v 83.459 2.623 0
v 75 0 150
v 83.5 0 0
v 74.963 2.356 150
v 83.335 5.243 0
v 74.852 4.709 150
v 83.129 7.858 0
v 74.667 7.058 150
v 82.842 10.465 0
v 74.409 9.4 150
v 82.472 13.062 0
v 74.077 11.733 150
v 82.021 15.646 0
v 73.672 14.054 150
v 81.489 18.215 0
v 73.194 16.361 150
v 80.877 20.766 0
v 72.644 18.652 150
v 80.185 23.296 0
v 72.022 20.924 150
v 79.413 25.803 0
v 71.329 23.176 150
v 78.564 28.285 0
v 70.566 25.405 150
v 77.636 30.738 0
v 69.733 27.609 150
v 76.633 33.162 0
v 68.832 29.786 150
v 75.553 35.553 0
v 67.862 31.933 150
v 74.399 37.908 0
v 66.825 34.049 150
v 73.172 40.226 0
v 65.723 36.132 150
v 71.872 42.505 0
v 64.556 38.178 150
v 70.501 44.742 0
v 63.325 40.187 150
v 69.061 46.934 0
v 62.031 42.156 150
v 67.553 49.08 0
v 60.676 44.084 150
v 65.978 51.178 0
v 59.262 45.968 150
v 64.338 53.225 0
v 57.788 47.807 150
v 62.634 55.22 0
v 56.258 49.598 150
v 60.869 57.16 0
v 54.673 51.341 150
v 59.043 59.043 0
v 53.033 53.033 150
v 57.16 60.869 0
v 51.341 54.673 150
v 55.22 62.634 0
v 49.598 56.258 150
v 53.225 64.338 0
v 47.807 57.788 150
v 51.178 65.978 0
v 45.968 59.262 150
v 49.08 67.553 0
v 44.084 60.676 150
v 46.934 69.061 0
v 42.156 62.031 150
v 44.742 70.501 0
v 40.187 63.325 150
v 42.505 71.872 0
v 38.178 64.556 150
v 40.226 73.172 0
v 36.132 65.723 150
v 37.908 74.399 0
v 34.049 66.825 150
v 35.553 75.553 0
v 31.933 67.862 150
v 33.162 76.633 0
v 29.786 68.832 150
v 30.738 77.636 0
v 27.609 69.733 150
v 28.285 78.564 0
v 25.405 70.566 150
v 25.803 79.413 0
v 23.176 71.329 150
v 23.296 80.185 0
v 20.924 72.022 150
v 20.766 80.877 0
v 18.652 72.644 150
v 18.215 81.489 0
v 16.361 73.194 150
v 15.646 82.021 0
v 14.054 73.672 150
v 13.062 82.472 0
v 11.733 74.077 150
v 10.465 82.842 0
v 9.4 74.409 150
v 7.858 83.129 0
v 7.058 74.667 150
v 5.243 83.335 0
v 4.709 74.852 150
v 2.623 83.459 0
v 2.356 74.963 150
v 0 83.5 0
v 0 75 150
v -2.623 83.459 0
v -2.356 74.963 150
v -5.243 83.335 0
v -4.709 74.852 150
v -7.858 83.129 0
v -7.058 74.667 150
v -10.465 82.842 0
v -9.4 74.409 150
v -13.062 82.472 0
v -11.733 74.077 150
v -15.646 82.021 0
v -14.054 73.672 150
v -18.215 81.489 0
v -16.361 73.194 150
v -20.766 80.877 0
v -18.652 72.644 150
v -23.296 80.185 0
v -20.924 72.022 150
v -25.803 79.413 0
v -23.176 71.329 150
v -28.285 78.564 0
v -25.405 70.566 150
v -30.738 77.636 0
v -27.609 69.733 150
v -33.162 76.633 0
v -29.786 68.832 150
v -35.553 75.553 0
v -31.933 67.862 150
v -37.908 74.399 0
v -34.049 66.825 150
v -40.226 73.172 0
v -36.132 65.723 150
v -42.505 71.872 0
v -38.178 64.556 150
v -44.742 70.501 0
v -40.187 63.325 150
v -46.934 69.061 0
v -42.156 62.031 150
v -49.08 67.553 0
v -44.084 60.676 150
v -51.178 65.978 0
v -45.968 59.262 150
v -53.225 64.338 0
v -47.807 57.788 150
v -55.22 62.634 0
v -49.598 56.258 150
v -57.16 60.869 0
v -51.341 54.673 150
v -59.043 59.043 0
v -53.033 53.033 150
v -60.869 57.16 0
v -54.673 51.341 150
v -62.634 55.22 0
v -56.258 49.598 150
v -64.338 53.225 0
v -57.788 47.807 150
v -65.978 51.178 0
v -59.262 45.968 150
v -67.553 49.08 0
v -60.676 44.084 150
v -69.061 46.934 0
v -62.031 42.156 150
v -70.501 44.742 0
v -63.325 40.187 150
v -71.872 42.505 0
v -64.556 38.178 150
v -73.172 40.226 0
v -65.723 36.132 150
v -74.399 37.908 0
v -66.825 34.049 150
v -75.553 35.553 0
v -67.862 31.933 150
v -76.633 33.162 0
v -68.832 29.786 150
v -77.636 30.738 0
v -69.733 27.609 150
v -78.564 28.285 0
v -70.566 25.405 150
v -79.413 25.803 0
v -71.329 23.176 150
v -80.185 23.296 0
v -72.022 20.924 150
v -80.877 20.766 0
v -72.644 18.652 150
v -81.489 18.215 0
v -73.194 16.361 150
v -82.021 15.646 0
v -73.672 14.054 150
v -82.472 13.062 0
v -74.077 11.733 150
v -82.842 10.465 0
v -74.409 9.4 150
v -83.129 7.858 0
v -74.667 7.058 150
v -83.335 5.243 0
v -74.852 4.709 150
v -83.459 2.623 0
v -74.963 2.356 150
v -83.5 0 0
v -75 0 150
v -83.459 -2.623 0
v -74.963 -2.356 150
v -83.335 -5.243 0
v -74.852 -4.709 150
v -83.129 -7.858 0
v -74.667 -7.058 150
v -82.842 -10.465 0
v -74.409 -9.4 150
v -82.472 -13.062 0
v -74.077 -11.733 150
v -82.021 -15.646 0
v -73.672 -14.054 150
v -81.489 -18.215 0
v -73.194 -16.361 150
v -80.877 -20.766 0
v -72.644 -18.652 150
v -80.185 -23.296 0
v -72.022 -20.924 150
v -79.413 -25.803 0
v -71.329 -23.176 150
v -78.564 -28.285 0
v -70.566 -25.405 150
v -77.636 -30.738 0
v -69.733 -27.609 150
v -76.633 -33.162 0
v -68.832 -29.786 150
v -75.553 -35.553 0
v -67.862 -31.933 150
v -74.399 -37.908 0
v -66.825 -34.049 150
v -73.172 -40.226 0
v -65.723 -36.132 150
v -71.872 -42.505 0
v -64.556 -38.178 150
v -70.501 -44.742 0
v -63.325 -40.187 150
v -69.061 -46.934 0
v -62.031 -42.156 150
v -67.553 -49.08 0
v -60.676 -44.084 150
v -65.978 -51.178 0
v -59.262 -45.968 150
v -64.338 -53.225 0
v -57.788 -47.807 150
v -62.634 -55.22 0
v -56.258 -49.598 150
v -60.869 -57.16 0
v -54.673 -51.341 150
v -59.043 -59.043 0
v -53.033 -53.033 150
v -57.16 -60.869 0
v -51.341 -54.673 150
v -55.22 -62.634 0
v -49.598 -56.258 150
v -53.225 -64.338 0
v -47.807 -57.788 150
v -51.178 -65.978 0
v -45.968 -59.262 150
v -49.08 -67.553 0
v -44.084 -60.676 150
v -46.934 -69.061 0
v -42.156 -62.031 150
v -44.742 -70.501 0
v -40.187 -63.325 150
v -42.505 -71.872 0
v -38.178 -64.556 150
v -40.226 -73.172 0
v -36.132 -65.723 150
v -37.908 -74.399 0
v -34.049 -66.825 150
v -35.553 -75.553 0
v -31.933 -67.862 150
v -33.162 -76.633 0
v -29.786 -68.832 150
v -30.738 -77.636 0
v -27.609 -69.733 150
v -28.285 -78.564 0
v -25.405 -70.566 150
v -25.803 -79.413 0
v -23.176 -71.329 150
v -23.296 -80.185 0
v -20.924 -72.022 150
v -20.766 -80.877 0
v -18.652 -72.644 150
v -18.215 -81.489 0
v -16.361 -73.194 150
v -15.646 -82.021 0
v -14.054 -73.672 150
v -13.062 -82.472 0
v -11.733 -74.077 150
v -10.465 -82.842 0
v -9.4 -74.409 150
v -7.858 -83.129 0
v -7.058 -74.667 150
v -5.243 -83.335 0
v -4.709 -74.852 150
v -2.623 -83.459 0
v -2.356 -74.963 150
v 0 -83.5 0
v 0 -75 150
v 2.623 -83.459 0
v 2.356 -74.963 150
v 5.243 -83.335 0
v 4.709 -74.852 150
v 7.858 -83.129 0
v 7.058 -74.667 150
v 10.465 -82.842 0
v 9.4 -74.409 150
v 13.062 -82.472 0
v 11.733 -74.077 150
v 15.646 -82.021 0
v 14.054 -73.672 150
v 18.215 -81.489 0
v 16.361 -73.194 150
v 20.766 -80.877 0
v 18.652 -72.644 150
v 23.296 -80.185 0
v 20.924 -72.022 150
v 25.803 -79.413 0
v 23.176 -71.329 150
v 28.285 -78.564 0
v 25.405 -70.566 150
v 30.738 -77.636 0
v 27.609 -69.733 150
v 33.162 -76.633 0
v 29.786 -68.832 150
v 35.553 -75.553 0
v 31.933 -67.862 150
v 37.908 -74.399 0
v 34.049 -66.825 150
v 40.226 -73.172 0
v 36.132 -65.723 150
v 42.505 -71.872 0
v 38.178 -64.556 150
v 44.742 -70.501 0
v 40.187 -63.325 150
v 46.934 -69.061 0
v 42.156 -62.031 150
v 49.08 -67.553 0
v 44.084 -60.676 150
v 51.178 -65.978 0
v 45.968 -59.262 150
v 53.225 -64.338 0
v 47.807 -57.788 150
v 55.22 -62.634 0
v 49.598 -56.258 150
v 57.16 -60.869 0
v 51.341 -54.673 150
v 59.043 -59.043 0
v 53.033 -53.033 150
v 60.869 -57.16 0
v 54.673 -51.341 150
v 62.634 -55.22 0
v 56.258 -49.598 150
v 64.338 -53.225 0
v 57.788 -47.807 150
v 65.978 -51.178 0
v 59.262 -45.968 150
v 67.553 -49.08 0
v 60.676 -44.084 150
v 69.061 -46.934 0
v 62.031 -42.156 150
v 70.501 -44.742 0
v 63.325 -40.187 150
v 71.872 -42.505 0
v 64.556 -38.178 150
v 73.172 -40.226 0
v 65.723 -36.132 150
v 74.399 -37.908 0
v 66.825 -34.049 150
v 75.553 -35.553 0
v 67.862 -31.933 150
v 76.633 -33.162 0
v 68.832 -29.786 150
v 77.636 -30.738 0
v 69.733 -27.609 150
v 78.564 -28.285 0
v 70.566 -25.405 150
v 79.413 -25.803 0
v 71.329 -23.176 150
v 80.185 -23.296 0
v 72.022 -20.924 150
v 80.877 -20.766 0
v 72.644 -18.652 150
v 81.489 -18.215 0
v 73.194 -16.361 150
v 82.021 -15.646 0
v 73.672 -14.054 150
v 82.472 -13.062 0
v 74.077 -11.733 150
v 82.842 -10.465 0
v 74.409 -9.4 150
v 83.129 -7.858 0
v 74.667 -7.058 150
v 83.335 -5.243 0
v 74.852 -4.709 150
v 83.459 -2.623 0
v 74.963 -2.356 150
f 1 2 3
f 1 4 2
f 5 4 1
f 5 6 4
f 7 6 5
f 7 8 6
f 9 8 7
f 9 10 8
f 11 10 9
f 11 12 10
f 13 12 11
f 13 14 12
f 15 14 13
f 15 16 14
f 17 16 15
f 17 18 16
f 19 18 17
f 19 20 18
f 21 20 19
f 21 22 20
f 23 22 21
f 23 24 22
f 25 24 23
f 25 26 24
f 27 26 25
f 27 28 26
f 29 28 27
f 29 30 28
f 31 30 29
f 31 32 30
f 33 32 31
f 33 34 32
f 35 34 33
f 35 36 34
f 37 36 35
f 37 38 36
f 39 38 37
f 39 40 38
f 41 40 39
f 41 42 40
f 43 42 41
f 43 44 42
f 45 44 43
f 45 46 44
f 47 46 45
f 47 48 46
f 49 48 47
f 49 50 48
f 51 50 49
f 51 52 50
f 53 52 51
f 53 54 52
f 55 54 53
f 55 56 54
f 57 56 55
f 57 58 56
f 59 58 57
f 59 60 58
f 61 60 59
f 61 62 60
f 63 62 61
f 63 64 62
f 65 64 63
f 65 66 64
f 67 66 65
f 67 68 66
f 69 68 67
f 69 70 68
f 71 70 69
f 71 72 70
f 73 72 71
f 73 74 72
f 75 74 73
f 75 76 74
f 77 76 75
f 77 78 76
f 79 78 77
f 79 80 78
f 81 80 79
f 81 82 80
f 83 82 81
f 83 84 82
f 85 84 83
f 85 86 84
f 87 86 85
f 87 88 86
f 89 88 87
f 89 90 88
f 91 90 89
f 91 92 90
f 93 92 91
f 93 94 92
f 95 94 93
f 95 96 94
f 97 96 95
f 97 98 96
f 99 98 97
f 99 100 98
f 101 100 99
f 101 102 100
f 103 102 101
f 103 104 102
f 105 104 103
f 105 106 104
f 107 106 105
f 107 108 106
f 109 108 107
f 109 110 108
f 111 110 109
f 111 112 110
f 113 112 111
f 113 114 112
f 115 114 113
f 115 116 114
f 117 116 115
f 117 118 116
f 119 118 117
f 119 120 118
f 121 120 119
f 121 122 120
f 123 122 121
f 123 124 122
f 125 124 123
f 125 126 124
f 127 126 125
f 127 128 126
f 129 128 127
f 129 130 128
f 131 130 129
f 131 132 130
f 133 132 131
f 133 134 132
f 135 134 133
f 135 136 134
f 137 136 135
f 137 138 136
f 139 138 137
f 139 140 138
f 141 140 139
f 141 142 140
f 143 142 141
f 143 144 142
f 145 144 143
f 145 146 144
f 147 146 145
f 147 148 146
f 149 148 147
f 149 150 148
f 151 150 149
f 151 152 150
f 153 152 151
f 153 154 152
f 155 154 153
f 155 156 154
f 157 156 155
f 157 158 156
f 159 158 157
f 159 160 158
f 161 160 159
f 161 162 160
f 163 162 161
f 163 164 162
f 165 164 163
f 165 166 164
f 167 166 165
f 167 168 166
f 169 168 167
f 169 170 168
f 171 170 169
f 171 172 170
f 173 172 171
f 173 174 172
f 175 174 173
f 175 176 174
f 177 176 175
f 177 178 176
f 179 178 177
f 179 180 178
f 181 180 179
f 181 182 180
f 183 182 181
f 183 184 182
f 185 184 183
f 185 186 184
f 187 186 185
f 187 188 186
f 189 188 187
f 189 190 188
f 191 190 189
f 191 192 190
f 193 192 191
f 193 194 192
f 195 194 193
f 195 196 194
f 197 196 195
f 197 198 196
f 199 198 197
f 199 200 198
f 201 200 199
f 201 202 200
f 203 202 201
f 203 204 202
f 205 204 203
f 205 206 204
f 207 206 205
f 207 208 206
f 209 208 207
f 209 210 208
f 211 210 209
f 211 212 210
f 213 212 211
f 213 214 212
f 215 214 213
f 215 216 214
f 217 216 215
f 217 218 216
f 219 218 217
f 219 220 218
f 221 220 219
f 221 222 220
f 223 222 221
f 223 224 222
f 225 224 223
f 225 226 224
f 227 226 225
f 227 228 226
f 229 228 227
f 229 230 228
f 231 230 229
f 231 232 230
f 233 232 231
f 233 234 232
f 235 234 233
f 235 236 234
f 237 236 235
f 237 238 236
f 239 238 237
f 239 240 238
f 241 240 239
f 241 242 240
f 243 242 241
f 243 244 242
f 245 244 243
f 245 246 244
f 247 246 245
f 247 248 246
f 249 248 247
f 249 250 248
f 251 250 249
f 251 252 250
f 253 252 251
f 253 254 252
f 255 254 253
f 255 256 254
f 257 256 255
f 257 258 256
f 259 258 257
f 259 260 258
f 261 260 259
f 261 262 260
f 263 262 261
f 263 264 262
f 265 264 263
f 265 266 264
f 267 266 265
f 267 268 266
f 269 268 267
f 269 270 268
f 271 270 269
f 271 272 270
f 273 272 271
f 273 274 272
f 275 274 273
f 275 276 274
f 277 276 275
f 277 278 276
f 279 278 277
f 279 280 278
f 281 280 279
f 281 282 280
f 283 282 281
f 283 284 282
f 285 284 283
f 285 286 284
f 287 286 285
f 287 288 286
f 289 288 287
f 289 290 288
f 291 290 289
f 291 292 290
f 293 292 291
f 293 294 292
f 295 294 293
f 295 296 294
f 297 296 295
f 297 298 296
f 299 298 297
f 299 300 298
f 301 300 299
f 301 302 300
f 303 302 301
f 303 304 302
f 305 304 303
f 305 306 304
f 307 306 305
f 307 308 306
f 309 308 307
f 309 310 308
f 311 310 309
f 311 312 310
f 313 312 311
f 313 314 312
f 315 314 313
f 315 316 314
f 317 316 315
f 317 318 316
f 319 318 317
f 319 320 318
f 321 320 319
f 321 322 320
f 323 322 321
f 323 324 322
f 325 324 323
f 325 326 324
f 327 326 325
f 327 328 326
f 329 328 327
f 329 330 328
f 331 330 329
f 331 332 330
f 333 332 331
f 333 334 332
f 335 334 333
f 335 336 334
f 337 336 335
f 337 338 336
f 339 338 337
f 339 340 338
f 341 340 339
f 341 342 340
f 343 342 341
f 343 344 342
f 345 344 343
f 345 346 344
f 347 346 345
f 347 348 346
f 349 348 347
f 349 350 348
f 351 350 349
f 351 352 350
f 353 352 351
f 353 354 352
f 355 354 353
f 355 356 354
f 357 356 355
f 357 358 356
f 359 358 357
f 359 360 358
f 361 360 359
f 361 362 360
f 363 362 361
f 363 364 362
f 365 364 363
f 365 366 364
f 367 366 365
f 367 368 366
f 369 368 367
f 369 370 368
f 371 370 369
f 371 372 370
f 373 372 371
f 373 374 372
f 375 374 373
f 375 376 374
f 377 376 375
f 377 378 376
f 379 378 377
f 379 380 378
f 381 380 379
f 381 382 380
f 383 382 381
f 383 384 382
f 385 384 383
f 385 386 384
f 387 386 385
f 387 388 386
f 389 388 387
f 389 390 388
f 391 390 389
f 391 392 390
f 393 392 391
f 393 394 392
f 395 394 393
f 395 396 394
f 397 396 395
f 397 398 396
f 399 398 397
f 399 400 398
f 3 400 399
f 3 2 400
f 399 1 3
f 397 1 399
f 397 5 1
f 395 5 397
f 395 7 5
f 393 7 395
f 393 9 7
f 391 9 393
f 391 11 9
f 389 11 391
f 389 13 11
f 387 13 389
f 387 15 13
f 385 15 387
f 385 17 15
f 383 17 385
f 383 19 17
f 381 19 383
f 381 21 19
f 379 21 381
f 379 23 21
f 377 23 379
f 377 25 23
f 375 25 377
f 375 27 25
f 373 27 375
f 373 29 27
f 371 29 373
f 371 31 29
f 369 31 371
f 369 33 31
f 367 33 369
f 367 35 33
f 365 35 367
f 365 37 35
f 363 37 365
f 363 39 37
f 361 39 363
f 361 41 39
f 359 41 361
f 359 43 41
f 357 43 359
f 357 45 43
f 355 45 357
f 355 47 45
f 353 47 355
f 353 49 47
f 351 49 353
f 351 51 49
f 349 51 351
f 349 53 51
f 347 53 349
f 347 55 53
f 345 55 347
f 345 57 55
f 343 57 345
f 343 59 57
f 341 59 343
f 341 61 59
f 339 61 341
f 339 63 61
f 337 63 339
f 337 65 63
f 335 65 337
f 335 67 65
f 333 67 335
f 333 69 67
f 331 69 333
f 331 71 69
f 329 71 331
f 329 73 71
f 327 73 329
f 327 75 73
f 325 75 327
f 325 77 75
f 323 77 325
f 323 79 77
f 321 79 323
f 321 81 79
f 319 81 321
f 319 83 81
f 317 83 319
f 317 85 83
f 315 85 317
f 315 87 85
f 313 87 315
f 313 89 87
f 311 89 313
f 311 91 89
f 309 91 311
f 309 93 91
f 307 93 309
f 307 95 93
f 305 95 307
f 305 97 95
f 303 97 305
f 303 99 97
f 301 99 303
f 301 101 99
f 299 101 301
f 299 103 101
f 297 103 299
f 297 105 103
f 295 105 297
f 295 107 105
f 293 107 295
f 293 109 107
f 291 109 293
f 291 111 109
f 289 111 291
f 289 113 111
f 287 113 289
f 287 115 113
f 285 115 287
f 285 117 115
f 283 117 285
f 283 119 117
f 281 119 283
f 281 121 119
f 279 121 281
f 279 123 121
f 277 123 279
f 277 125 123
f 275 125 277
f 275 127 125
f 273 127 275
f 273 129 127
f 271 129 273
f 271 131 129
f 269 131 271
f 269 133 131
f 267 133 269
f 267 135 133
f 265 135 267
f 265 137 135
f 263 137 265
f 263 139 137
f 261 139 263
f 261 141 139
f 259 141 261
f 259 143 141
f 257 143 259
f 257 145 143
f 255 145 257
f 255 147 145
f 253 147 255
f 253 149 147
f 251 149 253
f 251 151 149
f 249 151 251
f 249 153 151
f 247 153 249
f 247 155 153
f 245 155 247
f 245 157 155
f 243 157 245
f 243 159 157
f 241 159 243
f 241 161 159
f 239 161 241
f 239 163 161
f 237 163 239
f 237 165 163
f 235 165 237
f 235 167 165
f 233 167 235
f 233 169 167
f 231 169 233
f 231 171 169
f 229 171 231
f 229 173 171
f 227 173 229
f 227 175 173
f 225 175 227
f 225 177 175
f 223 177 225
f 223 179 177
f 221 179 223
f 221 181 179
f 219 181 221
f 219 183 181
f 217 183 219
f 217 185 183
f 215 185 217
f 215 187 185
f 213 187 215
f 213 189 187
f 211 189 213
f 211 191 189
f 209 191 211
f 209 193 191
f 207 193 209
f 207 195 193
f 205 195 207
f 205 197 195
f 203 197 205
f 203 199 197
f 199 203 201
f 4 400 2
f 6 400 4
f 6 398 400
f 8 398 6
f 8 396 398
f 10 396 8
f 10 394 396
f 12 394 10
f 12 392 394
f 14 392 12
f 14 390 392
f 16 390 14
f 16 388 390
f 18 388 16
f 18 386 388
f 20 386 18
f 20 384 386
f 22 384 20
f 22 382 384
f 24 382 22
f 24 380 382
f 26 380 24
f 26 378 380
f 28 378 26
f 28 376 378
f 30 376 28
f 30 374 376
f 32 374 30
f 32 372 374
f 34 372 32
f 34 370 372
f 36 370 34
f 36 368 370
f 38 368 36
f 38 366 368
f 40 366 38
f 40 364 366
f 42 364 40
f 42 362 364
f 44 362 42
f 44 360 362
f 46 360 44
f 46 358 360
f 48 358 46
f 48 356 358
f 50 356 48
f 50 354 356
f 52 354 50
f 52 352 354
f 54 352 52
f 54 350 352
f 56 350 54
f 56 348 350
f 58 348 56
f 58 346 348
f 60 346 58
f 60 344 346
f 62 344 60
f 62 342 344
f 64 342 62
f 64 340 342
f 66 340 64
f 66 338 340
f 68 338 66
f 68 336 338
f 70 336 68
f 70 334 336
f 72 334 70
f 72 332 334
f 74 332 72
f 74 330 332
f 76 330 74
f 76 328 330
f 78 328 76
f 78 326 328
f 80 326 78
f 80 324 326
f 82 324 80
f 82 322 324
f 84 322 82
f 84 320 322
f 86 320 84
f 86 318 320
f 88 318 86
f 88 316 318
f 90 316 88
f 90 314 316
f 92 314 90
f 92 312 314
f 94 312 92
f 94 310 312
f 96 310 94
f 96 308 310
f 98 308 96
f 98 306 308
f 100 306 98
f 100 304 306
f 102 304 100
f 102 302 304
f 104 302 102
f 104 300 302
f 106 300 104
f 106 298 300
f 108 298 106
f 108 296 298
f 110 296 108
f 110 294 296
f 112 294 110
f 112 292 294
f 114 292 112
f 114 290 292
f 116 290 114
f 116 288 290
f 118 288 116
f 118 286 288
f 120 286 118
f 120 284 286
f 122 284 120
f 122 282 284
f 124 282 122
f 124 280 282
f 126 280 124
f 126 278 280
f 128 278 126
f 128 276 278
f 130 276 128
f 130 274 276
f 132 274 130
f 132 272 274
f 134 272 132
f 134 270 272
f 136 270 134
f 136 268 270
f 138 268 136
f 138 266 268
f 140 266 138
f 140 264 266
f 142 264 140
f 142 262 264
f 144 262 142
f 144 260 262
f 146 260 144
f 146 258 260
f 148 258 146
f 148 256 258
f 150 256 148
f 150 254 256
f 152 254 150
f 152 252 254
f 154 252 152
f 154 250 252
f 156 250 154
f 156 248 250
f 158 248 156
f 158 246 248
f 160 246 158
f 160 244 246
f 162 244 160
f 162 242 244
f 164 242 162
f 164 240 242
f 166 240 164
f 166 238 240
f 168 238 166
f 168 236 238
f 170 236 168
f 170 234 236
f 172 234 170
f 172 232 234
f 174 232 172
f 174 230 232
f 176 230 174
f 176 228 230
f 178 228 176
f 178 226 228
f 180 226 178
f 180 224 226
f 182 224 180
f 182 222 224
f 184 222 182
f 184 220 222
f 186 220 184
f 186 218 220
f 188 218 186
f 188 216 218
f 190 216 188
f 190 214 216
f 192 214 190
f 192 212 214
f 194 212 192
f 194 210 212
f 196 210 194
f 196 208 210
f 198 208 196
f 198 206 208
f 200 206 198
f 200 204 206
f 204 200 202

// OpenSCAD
bottom=167;
top=150;
height=150;
$fn=200;

cylinder(d1=bottom, d2=top, h=height);
